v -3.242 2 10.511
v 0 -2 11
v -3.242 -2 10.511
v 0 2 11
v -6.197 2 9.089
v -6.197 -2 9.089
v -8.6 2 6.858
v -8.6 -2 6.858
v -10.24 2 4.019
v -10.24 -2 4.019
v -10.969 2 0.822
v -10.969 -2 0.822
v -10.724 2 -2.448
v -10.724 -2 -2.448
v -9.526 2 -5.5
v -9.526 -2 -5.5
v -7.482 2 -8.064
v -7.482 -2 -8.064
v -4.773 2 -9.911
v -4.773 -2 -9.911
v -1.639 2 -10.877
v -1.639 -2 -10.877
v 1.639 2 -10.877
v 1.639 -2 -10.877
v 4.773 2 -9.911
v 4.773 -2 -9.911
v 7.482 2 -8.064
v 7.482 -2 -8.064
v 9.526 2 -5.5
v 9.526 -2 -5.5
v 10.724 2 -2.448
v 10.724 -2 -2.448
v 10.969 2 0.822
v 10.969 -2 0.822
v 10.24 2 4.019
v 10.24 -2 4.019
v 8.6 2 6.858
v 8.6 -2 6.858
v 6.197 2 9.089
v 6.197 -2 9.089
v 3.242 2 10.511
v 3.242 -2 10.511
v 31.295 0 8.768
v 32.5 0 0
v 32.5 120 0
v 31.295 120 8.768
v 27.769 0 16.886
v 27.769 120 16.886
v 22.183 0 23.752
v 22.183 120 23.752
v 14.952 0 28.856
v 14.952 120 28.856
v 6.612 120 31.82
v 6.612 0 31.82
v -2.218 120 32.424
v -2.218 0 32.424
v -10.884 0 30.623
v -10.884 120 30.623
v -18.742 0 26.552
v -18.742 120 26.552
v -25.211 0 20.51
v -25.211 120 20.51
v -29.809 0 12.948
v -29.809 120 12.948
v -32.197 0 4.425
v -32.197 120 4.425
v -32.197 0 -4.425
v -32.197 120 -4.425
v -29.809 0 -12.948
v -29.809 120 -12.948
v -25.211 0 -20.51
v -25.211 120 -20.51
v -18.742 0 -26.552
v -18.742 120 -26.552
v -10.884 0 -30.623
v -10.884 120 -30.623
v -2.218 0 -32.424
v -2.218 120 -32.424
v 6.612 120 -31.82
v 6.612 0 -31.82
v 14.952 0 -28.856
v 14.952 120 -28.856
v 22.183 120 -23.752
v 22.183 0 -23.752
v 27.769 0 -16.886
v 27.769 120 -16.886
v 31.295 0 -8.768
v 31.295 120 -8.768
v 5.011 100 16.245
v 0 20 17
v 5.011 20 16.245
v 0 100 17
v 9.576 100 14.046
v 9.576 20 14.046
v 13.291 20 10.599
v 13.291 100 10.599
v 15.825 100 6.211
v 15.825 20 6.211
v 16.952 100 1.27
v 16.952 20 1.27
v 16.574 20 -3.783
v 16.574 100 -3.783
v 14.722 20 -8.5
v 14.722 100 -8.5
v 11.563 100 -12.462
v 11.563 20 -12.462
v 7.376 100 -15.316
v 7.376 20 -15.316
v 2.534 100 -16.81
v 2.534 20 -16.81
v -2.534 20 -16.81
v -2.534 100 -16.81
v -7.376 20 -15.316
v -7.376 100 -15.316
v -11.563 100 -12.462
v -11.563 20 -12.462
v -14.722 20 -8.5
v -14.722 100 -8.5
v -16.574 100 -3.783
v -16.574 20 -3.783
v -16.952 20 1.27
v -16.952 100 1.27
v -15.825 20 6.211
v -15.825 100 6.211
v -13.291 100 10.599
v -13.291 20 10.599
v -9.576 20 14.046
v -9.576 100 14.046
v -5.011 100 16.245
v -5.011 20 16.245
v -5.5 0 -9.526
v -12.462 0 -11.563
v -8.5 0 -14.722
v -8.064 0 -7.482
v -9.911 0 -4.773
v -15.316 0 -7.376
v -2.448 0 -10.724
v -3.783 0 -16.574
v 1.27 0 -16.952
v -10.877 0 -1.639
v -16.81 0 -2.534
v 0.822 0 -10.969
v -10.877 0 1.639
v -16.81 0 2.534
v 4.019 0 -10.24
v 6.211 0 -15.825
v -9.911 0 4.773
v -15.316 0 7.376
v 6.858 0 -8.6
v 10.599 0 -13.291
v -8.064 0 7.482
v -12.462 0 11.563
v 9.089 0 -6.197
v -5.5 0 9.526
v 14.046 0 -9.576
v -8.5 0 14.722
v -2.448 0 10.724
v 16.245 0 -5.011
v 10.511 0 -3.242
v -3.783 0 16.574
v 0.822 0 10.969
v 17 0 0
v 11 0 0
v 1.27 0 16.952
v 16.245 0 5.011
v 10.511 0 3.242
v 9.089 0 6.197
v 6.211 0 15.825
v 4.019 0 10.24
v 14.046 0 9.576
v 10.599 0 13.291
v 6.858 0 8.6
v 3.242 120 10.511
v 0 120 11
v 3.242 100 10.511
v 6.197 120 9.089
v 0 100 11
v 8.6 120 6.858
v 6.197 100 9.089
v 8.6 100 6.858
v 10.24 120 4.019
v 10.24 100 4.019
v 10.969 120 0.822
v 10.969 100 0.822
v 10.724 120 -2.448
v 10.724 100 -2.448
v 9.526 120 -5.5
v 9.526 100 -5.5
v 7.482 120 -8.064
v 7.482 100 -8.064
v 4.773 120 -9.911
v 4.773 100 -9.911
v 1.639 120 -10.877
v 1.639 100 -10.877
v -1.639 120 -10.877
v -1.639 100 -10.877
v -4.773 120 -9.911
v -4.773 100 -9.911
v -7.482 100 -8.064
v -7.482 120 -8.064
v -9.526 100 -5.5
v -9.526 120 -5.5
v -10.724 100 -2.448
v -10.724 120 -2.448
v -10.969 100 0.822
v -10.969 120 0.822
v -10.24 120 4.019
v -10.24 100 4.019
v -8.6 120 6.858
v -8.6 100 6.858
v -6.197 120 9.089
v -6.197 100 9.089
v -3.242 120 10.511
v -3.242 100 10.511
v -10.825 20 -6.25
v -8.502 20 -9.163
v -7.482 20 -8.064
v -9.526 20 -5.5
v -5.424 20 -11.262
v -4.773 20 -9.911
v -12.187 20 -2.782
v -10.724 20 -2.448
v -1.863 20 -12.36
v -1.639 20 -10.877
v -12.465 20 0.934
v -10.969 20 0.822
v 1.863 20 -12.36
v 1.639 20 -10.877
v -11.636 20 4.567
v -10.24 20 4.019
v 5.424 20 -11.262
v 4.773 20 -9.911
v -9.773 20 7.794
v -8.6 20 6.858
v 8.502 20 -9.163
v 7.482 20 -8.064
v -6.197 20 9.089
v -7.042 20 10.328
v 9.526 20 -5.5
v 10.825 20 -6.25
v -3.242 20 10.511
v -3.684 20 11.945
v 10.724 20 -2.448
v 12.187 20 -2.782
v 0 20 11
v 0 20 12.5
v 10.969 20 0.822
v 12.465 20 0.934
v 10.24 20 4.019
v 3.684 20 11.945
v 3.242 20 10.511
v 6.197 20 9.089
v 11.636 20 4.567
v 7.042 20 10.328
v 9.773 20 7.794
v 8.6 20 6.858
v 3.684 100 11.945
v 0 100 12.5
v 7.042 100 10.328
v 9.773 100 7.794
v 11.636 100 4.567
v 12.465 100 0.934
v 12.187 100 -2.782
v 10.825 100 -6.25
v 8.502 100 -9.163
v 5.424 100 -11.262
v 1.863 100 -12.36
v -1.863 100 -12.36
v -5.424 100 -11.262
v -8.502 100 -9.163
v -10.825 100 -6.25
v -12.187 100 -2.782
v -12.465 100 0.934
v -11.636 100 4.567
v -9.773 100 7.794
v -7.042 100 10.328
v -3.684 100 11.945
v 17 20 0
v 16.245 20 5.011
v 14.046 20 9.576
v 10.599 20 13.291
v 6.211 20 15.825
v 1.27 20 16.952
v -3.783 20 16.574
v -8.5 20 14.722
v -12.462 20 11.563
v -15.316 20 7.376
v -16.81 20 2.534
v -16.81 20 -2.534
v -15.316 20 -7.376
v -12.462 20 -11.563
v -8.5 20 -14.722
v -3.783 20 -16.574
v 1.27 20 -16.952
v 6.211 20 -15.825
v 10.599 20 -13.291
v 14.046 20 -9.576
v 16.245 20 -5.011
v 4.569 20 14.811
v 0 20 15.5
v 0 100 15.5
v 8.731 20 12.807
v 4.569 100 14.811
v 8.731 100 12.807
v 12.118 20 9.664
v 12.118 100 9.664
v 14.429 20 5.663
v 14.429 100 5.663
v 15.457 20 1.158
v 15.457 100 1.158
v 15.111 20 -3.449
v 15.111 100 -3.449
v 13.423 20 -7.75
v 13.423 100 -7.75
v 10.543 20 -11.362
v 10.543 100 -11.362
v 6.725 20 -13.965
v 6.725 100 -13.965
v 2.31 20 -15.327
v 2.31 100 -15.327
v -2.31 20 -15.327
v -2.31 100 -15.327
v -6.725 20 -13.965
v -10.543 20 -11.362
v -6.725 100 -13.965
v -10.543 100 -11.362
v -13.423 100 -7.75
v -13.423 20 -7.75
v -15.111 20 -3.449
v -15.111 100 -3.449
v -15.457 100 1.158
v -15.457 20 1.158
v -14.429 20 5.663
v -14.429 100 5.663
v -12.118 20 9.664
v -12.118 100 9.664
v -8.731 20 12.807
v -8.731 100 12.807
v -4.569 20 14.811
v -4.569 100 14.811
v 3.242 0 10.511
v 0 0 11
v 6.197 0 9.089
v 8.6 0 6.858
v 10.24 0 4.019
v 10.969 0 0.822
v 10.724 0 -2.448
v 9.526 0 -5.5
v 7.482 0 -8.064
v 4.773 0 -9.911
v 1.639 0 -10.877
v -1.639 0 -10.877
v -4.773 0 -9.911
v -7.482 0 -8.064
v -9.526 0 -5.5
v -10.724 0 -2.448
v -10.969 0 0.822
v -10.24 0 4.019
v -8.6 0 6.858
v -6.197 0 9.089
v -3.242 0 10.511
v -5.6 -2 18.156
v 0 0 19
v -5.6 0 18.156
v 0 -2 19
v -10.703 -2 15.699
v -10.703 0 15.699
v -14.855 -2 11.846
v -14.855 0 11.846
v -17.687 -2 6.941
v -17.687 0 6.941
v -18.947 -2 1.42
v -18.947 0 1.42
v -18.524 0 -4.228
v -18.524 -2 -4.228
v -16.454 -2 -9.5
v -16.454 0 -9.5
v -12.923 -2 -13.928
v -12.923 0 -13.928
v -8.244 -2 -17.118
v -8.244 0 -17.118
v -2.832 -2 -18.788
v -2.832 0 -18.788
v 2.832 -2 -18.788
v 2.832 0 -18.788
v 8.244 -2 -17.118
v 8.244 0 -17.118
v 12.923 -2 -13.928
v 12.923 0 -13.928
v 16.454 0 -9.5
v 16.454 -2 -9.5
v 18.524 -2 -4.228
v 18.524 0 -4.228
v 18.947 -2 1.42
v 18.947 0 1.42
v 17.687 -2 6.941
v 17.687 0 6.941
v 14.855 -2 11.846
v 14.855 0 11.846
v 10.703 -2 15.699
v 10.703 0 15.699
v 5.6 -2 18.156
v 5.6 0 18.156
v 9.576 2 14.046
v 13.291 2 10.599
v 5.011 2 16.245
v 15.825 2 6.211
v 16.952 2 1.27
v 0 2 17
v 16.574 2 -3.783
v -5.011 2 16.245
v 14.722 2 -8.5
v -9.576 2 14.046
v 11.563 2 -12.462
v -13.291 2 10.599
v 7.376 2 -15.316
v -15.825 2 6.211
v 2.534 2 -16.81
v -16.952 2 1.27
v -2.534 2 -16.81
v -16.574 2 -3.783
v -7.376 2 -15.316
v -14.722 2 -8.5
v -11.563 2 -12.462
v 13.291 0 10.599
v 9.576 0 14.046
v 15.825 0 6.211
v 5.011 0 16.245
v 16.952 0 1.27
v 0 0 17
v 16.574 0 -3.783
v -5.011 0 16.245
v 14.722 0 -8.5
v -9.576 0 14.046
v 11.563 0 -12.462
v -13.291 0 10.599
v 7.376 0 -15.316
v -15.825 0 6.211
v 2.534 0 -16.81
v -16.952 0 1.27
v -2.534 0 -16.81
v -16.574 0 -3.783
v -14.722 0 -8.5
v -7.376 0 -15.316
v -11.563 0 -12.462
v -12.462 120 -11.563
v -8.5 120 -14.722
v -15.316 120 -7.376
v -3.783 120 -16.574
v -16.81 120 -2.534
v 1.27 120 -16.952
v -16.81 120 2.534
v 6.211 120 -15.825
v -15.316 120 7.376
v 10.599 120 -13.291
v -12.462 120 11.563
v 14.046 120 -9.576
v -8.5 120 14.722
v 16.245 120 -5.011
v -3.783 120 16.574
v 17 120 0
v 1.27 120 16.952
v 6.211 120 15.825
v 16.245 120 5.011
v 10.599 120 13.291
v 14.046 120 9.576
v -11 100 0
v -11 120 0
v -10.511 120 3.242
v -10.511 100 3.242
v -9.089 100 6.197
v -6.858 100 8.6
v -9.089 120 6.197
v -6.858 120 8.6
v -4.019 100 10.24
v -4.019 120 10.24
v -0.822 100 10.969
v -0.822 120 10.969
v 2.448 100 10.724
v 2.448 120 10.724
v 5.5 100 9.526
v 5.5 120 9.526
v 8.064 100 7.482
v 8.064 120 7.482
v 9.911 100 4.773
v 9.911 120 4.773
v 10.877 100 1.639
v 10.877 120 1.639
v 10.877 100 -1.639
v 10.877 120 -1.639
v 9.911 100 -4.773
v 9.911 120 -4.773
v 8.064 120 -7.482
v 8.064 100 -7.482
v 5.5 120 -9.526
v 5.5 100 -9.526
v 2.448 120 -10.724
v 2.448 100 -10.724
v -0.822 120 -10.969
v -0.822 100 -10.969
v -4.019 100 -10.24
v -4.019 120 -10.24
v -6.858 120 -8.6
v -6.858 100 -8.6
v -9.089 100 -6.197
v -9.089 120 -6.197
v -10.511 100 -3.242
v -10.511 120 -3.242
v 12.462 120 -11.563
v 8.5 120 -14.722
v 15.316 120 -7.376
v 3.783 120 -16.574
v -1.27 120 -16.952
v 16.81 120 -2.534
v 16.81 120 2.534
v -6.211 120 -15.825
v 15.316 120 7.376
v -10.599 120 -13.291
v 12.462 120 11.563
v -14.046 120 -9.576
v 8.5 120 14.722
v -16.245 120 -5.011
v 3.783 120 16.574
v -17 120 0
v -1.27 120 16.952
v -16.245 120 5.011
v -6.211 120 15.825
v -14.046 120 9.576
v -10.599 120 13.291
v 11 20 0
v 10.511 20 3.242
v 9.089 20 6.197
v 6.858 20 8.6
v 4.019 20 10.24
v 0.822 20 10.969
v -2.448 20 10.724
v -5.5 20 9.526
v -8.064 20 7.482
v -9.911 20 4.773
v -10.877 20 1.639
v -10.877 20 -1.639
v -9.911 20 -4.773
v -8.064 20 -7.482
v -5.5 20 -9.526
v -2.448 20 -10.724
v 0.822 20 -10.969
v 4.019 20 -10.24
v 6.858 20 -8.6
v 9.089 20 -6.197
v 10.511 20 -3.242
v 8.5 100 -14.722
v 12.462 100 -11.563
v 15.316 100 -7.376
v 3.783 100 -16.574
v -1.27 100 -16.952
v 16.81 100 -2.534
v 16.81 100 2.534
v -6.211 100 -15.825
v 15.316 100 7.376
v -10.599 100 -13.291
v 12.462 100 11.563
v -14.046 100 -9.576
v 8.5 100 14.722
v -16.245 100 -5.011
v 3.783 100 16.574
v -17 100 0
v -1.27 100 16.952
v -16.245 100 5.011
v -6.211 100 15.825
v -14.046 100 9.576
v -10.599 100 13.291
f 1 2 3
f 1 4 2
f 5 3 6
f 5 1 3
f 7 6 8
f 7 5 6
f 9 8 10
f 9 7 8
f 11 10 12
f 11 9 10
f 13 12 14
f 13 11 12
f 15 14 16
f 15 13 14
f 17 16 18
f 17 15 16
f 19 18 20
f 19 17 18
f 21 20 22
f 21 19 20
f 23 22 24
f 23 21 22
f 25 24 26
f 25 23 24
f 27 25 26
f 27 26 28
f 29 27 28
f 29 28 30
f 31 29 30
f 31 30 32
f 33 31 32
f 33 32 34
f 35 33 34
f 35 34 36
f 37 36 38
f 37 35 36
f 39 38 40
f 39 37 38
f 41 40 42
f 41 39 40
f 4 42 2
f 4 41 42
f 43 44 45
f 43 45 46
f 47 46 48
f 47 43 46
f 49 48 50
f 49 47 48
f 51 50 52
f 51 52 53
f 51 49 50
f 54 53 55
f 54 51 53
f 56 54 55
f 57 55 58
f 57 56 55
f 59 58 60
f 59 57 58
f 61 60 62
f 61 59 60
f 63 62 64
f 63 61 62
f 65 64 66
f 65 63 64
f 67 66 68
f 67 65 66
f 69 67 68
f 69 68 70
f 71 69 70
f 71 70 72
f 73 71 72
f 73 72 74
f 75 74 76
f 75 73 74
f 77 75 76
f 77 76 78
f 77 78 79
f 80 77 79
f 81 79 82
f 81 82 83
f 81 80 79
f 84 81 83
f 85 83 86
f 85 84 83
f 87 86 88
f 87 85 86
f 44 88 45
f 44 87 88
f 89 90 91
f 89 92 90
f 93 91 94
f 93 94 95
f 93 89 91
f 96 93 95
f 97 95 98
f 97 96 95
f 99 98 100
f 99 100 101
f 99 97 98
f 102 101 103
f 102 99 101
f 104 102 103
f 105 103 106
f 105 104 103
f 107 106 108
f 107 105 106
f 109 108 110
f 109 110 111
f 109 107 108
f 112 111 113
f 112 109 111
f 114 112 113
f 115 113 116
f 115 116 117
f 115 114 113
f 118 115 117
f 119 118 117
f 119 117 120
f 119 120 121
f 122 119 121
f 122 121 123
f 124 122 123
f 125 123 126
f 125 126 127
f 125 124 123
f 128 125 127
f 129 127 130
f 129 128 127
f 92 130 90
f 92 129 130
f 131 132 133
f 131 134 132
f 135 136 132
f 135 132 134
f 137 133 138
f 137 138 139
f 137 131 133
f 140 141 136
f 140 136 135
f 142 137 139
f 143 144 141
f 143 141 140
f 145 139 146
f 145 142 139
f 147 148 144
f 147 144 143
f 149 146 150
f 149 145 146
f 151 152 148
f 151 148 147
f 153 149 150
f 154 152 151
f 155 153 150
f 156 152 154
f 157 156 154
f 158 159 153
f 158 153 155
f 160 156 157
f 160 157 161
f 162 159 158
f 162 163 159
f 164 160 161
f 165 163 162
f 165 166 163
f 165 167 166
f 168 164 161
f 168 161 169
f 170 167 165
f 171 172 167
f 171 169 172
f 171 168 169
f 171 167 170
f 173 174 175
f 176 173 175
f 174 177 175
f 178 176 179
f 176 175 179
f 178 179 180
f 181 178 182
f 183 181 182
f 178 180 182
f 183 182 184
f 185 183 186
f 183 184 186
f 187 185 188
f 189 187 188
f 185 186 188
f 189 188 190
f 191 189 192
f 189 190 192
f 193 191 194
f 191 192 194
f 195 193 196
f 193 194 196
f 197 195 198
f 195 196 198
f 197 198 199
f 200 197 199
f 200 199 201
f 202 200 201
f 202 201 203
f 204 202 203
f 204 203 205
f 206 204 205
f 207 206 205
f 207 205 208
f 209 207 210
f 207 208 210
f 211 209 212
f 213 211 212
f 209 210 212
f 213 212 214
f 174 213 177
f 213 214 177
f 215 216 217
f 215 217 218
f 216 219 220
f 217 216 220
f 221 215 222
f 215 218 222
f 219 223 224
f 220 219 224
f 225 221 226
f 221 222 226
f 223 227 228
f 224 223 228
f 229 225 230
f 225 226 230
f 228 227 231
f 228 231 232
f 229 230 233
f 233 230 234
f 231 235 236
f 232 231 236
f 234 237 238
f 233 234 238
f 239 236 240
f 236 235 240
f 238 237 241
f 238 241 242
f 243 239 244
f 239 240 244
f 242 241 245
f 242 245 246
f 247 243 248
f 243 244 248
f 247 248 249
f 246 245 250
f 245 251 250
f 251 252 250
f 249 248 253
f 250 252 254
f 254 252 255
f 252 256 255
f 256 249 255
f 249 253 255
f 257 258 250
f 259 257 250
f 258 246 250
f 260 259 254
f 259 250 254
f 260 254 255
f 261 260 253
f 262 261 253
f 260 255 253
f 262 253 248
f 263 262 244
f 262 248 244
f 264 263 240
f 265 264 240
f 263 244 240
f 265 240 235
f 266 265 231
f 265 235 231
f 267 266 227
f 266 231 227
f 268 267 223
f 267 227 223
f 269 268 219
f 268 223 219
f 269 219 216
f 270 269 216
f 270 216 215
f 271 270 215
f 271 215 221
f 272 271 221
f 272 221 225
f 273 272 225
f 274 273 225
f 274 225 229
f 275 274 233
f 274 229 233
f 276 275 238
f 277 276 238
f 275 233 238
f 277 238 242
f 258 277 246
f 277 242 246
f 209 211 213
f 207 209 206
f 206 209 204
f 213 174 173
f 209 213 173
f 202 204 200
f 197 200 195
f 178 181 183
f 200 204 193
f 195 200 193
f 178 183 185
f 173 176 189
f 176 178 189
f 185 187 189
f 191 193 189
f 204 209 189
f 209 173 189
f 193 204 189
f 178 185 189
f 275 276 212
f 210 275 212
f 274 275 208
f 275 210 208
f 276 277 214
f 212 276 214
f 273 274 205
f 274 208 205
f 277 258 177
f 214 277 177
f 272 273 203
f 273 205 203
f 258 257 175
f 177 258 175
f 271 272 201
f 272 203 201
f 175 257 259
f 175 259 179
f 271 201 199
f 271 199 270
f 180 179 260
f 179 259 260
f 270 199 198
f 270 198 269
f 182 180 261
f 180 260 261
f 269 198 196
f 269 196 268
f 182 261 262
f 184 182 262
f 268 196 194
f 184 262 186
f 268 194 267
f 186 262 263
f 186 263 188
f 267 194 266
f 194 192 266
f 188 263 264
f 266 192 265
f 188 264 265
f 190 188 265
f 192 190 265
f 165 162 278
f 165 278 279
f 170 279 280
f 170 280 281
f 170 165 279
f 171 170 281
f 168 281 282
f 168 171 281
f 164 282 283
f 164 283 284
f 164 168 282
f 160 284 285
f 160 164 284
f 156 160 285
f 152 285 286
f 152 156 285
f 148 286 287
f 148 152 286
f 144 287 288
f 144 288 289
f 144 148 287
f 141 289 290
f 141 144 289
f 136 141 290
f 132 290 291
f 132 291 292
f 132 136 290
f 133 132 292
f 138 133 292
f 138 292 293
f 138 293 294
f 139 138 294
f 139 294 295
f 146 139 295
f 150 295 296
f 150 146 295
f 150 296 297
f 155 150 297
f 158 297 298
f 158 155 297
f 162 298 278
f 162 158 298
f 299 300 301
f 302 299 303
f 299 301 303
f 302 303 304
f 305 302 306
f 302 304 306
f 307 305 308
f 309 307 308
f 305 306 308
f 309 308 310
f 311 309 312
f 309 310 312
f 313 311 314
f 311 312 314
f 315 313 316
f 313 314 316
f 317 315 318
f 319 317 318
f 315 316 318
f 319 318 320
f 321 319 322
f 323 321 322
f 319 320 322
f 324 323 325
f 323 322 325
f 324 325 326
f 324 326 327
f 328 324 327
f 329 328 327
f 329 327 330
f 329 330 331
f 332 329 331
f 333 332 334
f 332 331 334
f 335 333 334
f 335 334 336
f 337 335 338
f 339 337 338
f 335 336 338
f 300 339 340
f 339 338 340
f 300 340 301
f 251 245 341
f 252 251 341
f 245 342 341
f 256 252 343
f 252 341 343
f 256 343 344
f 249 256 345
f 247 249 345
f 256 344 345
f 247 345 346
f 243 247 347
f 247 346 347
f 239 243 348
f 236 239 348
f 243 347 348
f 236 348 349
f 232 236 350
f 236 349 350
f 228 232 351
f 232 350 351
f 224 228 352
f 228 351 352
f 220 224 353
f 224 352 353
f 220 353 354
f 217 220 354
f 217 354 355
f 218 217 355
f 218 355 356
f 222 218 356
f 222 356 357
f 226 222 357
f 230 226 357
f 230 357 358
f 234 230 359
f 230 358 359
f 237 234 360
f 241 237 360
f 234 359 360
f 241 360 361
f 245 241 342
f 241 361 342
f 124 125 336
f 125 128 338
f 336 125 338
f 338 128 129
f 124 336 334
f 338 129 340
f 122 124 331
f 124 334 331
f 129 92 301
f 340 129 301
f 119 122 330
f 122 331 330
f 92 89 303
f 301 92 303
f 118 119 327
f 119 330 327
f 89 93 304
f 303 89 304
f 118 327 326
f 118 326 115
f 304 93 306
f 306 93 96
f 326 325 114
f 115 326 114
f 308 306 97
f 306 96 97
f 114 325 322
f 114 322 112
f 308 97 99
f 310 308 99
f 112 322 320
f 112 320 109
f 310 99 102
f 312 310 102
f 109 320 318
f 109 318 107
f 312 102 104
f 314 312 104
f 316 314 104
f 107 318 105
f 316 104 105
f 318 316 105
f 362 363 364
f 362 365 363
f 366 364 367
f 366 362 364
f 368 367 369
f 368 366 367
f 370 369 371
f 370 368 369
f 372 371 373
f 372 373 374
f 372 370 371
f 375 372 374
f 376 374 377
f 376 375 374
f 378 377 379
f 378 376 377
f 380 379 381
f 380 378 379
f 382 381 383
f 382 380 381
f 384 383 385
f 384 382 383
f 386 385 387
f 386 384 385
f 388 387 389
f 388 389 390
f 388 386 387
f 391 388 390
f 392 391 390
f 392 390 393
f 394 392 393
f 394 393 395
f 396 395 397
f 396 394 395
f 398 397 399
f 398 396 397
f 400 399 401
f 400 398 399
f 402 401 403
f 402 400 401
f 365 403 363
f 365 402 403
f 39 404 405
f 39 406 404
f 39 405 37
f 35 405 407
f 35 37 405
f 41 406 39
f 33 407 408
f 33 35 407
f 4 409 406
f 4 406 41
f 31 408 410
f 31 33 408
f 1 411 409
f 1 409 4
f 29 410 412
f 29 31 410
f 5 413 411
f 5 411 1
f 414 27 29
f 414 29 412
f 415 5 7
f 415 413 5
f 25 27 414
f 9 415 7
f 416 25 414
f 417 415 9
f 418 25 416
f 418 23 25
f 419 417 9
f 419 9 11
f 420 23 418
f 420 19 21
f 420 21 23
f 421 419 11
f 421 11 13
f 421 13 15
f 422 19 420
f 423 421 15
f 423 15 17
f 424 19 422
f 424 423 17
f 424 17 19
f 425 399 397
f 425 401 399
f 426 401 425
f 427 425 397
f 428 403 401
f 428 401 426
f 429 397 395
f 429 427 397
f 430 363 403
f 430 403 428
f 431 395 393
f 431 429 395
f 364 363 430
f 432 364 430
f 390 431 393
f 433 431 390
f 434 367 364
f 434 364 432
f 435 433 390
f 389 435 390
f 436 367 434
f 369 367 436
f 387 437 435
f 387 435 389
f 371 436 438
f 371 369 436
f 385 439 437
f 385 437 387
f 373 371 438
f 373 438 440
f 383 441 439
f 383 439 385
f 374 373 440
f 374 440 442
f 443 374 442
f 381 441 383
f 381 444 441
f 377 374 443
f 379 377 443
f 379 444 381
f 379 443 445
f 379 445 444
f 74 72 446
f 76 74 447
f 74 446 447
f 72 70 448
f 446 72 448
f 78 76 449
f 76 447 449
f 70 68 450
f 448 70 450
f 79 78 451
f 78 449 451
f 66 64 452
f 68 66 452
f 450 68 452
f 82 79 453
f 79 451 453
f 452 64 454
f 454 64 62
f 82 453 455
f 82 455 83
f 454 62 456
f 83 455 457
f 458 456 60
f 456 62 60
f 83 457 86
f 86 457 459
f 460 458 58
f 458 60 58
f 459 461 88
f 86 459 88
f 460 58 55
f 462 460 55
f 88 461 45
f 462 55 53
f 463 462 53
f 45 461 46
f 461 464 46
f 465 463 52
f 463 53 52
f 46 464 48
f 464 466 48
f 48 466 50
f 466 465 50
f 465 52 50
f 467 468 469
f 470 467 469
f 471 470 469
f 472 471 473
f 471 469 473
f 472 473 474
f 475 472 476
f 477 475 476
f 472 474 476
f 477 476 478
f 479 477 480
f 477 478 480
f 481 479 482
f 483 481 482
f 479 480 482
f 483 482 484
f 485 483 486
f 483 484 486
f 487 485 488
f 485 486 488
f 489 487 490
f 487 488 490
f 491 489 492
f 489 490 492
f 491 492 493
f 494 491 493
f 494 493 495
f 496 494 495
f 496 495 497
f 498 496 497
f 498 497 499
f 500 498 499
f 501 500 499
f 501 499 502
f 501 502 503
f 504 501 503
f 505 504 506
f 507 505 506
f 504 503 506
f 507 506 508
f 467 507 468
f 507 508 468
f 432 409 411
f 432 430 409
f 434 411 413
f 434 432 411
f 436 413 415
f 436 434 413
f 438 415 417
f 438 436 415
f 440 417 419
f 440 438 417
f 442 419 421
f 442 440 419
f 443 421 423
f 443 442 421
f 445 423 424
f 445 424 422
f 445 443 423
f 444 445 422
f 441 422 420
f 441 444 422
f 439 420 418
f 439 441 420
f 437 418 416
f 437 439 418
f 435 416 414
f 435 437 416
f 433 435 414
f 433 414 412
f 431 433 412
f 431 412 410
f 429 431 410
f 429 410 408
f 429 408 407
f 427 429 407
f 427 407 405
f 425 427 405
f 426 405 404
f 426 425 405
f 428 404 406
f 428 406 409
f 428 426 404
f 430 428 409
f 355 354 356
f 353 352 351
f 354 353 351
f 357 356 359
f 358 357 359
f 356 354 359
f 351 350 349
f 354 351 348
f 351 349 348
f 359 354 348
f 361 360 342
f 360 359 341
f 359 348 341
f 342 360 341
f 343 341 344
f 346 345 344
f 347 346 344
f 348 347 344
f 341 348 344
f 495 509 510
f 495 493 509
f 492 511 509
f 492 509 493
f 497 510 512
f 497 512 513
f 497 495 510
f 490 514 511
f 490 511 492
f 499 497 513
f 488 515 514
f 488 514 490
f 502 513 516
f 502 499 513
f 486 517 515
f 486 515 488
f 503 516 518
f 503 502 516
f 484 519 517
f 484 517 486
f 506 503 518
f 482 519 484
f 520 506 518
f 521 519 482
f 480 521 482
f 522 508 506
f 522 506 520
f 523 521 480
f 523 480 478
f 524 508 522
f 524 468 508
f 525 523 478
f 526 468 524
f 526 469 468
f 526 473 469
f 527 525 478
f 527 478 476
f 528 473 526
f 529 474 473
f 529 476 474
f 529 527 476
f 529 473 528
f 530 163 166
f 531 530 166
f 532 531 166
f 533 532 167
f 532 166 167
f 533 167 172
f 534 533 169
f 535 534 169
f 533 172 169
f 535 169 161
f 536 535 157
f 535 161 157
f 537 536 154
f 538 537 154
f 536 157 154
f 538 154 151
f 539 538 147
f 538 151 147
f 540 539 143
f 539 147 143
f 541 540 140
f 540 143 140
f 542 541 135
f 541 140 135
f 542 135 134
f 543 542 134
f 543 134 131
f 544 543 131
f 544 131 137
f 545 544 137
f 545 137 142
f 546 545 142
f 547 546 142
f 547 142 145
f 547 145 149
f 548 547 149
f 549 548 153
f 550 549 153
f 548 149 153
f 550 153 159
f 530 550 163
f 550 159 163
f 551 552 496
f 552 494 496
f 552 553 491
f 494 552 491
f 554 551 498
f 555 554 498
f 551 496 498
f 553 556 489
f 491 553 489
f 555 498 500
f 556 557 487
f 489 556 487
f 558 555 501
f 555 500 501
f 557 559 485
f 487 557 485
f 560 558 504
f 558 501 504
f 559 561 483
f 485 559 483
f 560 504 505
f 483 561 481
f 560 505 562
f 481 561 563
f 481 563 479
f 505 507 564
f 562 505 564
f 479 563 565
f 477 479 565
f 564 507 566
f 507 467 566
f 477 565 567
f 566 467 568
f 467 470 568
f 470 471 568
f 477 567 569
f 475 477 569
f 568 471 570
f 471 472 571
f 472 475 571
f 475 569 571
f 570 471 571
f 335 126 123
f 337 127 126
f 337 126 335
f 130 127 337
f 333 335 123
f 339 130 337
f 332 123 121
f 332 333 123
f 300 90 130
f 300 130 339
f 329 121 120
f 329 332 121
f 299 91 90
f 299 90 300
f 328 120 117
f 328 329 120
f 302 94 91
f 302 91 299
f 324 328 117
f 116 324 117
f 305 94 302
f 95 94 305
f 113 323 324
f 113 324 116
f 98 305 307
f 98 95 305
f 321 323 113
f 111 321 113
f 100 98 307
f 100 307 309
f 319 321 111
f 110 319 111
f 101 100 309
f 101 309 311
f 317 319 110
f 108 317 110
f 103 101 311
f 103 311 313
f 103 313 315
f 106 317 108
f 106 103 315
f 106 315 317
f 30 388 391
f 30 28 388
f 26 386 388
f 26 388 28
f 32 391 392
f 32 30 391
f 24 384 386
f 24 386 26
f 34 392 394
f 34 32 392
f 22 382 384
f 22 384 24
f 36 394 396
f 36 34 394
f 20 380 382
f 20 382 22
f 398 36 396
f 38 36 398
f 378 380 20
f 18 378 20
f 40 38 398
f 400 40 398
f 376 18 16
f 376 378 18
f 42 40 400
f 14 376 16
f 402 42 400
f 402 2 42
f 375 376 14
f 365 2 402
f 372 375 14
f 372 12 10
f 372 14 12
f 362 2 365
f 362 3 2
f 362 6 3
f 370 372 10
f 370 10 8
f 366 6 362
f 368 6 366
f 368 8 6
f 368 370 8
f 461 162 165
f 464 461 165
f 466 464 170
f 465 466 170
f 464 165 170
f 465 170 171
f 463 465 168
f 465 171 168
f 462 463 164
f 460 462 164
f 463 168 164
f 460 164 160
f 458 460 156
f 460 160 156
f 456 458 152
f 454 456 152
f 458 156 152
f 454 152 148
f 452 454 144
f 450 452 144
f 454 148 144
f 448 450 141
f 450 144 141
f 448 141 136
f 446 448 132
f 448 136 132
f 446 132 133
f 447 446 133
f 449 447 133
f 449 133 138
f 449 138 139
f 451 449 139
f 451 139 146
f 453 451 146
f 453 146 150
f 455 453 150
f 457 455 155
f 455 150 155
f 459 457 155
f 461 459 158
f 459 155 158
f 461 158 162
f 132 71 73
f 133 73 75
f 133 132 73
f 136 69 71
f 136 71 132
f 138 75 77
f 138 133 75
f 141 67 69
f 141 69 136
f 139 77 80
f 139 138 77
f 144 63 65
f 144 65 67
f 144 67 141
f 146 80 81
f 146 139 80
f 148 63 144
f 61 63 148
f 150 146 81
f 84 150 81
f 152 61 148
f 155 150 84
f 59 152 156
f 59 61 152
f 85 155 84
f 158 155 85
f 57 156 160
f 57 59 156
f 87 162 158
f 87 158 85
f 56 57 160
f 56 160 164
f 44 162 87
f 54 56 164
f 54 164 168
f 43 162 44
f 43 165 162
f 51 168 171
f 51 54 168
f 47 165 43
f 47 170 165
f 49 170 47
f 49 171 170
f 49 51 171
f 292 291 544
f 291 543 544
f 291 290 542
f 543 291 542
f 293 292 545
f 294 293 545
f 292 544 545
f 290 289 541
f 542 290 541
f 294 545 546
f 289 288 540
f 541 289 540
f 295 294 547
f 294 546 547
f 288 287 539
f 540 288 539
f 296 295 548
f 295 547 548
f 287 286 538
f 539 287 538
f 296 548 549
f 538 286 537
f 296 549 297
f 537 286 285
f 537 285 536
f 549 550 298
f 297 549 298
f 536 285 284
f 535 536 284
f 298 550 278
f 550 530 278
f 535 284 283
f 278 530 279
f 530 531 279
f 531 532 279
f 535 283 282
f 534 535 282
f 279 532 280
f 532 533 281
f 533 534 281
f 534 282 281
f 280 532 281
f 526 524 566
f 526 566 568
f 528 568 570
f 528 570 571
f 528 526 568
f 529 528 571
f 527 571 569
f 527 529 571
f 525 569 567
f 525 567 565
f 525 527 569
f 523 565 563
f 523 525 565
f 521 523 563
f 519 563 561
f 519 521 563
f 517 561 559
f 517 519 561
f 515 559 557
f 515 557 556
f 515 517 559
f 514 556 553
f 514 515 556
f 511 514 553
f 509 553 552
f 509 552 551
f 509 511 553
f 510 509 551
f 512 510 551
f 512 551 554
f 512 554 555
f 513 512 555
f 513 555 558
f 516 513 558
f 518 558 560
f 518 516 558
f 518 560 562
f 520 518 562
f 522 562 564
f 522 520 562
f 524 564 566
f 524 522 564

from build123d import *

# Parameters (mm, degrees)
F0_R     = 32.5
F0_R_2   = 17
F1_DEPTH = 120
F2_R     = 17
F2_R_2   = 11
F3_DEPTH = 20
F4_R     = 17
F4_R_2   = 11
F5_DEPTH = 20
F8_W     = 80
F8_H     = 1.5


with BuildPart() as f1:
    # F0 (on Front) → F1 (new body)
    with BuildSketch(Plane.XZ):
        Circle(F0_R)
        Circle(F0_R_2, mode=Mode.SUBTRACT)
    extrude(amount=-F1_DEPTH)


with BuildPart() as f3:
    # F2 (on face) → F3 (new body)
    with BuildSketch(Plane.XZ):
        Circle(F2_R)
        Circle(F2_R_2, mode=Mode.SUBTRACT)
    extrude(amount=-F3_DEPTH)


with BuildPart() as f5:
    # F4 (on face) → F5 (new body)
    with BuildSketch(Plane(origin=(0, 120, 0), x_dir=(-1, 0, 0), z_dir=(0, 1, 0))):
        Circle(F4_R)
        Circle(F4_R_2, mode=Mode.SUBTRACT)
    extrude(amount=-F5_DEPTH)


with BuildPart() as f7:
    # F6 (on Right) → F7 (revolve)
    with BuildSketch(Plane.YZ):
        Polygon((0, 11), (0, 0), (120, 0), (120, 11), (100, 11), (100, 12.5), (20, 12.5), (20, 11), align=None)
    revolve(axis=Axis((0, 61.001737, 0), (0, 1, 0)))


with BuildPart() as f9:
    # F8 (on Right) → F9 (revolve)
    with BuildSketch(Plane.YZ):
        with Locations((60, 16.25)):
            Rectangle(F8_W, F8_H)
    revolve(axis=Axis((0, 66.656585, 0), (0, 1, 0)))


with BuildPart() as f11:
    # F10 (on Right) → F11 (revolve)
    with BuildSketch(Plane.YZ):
        Polygon((0, 17), (0, 19), (-2, 19), (-2, 11), (2, 11), (2, 17), align=None)
    revolve(axis=Axis((0, -15.834864, 0), (0, -1, 0)))


solid = Compound([f1.part, f3.part, f5.part, f7.part, f9.part, f11.part])
